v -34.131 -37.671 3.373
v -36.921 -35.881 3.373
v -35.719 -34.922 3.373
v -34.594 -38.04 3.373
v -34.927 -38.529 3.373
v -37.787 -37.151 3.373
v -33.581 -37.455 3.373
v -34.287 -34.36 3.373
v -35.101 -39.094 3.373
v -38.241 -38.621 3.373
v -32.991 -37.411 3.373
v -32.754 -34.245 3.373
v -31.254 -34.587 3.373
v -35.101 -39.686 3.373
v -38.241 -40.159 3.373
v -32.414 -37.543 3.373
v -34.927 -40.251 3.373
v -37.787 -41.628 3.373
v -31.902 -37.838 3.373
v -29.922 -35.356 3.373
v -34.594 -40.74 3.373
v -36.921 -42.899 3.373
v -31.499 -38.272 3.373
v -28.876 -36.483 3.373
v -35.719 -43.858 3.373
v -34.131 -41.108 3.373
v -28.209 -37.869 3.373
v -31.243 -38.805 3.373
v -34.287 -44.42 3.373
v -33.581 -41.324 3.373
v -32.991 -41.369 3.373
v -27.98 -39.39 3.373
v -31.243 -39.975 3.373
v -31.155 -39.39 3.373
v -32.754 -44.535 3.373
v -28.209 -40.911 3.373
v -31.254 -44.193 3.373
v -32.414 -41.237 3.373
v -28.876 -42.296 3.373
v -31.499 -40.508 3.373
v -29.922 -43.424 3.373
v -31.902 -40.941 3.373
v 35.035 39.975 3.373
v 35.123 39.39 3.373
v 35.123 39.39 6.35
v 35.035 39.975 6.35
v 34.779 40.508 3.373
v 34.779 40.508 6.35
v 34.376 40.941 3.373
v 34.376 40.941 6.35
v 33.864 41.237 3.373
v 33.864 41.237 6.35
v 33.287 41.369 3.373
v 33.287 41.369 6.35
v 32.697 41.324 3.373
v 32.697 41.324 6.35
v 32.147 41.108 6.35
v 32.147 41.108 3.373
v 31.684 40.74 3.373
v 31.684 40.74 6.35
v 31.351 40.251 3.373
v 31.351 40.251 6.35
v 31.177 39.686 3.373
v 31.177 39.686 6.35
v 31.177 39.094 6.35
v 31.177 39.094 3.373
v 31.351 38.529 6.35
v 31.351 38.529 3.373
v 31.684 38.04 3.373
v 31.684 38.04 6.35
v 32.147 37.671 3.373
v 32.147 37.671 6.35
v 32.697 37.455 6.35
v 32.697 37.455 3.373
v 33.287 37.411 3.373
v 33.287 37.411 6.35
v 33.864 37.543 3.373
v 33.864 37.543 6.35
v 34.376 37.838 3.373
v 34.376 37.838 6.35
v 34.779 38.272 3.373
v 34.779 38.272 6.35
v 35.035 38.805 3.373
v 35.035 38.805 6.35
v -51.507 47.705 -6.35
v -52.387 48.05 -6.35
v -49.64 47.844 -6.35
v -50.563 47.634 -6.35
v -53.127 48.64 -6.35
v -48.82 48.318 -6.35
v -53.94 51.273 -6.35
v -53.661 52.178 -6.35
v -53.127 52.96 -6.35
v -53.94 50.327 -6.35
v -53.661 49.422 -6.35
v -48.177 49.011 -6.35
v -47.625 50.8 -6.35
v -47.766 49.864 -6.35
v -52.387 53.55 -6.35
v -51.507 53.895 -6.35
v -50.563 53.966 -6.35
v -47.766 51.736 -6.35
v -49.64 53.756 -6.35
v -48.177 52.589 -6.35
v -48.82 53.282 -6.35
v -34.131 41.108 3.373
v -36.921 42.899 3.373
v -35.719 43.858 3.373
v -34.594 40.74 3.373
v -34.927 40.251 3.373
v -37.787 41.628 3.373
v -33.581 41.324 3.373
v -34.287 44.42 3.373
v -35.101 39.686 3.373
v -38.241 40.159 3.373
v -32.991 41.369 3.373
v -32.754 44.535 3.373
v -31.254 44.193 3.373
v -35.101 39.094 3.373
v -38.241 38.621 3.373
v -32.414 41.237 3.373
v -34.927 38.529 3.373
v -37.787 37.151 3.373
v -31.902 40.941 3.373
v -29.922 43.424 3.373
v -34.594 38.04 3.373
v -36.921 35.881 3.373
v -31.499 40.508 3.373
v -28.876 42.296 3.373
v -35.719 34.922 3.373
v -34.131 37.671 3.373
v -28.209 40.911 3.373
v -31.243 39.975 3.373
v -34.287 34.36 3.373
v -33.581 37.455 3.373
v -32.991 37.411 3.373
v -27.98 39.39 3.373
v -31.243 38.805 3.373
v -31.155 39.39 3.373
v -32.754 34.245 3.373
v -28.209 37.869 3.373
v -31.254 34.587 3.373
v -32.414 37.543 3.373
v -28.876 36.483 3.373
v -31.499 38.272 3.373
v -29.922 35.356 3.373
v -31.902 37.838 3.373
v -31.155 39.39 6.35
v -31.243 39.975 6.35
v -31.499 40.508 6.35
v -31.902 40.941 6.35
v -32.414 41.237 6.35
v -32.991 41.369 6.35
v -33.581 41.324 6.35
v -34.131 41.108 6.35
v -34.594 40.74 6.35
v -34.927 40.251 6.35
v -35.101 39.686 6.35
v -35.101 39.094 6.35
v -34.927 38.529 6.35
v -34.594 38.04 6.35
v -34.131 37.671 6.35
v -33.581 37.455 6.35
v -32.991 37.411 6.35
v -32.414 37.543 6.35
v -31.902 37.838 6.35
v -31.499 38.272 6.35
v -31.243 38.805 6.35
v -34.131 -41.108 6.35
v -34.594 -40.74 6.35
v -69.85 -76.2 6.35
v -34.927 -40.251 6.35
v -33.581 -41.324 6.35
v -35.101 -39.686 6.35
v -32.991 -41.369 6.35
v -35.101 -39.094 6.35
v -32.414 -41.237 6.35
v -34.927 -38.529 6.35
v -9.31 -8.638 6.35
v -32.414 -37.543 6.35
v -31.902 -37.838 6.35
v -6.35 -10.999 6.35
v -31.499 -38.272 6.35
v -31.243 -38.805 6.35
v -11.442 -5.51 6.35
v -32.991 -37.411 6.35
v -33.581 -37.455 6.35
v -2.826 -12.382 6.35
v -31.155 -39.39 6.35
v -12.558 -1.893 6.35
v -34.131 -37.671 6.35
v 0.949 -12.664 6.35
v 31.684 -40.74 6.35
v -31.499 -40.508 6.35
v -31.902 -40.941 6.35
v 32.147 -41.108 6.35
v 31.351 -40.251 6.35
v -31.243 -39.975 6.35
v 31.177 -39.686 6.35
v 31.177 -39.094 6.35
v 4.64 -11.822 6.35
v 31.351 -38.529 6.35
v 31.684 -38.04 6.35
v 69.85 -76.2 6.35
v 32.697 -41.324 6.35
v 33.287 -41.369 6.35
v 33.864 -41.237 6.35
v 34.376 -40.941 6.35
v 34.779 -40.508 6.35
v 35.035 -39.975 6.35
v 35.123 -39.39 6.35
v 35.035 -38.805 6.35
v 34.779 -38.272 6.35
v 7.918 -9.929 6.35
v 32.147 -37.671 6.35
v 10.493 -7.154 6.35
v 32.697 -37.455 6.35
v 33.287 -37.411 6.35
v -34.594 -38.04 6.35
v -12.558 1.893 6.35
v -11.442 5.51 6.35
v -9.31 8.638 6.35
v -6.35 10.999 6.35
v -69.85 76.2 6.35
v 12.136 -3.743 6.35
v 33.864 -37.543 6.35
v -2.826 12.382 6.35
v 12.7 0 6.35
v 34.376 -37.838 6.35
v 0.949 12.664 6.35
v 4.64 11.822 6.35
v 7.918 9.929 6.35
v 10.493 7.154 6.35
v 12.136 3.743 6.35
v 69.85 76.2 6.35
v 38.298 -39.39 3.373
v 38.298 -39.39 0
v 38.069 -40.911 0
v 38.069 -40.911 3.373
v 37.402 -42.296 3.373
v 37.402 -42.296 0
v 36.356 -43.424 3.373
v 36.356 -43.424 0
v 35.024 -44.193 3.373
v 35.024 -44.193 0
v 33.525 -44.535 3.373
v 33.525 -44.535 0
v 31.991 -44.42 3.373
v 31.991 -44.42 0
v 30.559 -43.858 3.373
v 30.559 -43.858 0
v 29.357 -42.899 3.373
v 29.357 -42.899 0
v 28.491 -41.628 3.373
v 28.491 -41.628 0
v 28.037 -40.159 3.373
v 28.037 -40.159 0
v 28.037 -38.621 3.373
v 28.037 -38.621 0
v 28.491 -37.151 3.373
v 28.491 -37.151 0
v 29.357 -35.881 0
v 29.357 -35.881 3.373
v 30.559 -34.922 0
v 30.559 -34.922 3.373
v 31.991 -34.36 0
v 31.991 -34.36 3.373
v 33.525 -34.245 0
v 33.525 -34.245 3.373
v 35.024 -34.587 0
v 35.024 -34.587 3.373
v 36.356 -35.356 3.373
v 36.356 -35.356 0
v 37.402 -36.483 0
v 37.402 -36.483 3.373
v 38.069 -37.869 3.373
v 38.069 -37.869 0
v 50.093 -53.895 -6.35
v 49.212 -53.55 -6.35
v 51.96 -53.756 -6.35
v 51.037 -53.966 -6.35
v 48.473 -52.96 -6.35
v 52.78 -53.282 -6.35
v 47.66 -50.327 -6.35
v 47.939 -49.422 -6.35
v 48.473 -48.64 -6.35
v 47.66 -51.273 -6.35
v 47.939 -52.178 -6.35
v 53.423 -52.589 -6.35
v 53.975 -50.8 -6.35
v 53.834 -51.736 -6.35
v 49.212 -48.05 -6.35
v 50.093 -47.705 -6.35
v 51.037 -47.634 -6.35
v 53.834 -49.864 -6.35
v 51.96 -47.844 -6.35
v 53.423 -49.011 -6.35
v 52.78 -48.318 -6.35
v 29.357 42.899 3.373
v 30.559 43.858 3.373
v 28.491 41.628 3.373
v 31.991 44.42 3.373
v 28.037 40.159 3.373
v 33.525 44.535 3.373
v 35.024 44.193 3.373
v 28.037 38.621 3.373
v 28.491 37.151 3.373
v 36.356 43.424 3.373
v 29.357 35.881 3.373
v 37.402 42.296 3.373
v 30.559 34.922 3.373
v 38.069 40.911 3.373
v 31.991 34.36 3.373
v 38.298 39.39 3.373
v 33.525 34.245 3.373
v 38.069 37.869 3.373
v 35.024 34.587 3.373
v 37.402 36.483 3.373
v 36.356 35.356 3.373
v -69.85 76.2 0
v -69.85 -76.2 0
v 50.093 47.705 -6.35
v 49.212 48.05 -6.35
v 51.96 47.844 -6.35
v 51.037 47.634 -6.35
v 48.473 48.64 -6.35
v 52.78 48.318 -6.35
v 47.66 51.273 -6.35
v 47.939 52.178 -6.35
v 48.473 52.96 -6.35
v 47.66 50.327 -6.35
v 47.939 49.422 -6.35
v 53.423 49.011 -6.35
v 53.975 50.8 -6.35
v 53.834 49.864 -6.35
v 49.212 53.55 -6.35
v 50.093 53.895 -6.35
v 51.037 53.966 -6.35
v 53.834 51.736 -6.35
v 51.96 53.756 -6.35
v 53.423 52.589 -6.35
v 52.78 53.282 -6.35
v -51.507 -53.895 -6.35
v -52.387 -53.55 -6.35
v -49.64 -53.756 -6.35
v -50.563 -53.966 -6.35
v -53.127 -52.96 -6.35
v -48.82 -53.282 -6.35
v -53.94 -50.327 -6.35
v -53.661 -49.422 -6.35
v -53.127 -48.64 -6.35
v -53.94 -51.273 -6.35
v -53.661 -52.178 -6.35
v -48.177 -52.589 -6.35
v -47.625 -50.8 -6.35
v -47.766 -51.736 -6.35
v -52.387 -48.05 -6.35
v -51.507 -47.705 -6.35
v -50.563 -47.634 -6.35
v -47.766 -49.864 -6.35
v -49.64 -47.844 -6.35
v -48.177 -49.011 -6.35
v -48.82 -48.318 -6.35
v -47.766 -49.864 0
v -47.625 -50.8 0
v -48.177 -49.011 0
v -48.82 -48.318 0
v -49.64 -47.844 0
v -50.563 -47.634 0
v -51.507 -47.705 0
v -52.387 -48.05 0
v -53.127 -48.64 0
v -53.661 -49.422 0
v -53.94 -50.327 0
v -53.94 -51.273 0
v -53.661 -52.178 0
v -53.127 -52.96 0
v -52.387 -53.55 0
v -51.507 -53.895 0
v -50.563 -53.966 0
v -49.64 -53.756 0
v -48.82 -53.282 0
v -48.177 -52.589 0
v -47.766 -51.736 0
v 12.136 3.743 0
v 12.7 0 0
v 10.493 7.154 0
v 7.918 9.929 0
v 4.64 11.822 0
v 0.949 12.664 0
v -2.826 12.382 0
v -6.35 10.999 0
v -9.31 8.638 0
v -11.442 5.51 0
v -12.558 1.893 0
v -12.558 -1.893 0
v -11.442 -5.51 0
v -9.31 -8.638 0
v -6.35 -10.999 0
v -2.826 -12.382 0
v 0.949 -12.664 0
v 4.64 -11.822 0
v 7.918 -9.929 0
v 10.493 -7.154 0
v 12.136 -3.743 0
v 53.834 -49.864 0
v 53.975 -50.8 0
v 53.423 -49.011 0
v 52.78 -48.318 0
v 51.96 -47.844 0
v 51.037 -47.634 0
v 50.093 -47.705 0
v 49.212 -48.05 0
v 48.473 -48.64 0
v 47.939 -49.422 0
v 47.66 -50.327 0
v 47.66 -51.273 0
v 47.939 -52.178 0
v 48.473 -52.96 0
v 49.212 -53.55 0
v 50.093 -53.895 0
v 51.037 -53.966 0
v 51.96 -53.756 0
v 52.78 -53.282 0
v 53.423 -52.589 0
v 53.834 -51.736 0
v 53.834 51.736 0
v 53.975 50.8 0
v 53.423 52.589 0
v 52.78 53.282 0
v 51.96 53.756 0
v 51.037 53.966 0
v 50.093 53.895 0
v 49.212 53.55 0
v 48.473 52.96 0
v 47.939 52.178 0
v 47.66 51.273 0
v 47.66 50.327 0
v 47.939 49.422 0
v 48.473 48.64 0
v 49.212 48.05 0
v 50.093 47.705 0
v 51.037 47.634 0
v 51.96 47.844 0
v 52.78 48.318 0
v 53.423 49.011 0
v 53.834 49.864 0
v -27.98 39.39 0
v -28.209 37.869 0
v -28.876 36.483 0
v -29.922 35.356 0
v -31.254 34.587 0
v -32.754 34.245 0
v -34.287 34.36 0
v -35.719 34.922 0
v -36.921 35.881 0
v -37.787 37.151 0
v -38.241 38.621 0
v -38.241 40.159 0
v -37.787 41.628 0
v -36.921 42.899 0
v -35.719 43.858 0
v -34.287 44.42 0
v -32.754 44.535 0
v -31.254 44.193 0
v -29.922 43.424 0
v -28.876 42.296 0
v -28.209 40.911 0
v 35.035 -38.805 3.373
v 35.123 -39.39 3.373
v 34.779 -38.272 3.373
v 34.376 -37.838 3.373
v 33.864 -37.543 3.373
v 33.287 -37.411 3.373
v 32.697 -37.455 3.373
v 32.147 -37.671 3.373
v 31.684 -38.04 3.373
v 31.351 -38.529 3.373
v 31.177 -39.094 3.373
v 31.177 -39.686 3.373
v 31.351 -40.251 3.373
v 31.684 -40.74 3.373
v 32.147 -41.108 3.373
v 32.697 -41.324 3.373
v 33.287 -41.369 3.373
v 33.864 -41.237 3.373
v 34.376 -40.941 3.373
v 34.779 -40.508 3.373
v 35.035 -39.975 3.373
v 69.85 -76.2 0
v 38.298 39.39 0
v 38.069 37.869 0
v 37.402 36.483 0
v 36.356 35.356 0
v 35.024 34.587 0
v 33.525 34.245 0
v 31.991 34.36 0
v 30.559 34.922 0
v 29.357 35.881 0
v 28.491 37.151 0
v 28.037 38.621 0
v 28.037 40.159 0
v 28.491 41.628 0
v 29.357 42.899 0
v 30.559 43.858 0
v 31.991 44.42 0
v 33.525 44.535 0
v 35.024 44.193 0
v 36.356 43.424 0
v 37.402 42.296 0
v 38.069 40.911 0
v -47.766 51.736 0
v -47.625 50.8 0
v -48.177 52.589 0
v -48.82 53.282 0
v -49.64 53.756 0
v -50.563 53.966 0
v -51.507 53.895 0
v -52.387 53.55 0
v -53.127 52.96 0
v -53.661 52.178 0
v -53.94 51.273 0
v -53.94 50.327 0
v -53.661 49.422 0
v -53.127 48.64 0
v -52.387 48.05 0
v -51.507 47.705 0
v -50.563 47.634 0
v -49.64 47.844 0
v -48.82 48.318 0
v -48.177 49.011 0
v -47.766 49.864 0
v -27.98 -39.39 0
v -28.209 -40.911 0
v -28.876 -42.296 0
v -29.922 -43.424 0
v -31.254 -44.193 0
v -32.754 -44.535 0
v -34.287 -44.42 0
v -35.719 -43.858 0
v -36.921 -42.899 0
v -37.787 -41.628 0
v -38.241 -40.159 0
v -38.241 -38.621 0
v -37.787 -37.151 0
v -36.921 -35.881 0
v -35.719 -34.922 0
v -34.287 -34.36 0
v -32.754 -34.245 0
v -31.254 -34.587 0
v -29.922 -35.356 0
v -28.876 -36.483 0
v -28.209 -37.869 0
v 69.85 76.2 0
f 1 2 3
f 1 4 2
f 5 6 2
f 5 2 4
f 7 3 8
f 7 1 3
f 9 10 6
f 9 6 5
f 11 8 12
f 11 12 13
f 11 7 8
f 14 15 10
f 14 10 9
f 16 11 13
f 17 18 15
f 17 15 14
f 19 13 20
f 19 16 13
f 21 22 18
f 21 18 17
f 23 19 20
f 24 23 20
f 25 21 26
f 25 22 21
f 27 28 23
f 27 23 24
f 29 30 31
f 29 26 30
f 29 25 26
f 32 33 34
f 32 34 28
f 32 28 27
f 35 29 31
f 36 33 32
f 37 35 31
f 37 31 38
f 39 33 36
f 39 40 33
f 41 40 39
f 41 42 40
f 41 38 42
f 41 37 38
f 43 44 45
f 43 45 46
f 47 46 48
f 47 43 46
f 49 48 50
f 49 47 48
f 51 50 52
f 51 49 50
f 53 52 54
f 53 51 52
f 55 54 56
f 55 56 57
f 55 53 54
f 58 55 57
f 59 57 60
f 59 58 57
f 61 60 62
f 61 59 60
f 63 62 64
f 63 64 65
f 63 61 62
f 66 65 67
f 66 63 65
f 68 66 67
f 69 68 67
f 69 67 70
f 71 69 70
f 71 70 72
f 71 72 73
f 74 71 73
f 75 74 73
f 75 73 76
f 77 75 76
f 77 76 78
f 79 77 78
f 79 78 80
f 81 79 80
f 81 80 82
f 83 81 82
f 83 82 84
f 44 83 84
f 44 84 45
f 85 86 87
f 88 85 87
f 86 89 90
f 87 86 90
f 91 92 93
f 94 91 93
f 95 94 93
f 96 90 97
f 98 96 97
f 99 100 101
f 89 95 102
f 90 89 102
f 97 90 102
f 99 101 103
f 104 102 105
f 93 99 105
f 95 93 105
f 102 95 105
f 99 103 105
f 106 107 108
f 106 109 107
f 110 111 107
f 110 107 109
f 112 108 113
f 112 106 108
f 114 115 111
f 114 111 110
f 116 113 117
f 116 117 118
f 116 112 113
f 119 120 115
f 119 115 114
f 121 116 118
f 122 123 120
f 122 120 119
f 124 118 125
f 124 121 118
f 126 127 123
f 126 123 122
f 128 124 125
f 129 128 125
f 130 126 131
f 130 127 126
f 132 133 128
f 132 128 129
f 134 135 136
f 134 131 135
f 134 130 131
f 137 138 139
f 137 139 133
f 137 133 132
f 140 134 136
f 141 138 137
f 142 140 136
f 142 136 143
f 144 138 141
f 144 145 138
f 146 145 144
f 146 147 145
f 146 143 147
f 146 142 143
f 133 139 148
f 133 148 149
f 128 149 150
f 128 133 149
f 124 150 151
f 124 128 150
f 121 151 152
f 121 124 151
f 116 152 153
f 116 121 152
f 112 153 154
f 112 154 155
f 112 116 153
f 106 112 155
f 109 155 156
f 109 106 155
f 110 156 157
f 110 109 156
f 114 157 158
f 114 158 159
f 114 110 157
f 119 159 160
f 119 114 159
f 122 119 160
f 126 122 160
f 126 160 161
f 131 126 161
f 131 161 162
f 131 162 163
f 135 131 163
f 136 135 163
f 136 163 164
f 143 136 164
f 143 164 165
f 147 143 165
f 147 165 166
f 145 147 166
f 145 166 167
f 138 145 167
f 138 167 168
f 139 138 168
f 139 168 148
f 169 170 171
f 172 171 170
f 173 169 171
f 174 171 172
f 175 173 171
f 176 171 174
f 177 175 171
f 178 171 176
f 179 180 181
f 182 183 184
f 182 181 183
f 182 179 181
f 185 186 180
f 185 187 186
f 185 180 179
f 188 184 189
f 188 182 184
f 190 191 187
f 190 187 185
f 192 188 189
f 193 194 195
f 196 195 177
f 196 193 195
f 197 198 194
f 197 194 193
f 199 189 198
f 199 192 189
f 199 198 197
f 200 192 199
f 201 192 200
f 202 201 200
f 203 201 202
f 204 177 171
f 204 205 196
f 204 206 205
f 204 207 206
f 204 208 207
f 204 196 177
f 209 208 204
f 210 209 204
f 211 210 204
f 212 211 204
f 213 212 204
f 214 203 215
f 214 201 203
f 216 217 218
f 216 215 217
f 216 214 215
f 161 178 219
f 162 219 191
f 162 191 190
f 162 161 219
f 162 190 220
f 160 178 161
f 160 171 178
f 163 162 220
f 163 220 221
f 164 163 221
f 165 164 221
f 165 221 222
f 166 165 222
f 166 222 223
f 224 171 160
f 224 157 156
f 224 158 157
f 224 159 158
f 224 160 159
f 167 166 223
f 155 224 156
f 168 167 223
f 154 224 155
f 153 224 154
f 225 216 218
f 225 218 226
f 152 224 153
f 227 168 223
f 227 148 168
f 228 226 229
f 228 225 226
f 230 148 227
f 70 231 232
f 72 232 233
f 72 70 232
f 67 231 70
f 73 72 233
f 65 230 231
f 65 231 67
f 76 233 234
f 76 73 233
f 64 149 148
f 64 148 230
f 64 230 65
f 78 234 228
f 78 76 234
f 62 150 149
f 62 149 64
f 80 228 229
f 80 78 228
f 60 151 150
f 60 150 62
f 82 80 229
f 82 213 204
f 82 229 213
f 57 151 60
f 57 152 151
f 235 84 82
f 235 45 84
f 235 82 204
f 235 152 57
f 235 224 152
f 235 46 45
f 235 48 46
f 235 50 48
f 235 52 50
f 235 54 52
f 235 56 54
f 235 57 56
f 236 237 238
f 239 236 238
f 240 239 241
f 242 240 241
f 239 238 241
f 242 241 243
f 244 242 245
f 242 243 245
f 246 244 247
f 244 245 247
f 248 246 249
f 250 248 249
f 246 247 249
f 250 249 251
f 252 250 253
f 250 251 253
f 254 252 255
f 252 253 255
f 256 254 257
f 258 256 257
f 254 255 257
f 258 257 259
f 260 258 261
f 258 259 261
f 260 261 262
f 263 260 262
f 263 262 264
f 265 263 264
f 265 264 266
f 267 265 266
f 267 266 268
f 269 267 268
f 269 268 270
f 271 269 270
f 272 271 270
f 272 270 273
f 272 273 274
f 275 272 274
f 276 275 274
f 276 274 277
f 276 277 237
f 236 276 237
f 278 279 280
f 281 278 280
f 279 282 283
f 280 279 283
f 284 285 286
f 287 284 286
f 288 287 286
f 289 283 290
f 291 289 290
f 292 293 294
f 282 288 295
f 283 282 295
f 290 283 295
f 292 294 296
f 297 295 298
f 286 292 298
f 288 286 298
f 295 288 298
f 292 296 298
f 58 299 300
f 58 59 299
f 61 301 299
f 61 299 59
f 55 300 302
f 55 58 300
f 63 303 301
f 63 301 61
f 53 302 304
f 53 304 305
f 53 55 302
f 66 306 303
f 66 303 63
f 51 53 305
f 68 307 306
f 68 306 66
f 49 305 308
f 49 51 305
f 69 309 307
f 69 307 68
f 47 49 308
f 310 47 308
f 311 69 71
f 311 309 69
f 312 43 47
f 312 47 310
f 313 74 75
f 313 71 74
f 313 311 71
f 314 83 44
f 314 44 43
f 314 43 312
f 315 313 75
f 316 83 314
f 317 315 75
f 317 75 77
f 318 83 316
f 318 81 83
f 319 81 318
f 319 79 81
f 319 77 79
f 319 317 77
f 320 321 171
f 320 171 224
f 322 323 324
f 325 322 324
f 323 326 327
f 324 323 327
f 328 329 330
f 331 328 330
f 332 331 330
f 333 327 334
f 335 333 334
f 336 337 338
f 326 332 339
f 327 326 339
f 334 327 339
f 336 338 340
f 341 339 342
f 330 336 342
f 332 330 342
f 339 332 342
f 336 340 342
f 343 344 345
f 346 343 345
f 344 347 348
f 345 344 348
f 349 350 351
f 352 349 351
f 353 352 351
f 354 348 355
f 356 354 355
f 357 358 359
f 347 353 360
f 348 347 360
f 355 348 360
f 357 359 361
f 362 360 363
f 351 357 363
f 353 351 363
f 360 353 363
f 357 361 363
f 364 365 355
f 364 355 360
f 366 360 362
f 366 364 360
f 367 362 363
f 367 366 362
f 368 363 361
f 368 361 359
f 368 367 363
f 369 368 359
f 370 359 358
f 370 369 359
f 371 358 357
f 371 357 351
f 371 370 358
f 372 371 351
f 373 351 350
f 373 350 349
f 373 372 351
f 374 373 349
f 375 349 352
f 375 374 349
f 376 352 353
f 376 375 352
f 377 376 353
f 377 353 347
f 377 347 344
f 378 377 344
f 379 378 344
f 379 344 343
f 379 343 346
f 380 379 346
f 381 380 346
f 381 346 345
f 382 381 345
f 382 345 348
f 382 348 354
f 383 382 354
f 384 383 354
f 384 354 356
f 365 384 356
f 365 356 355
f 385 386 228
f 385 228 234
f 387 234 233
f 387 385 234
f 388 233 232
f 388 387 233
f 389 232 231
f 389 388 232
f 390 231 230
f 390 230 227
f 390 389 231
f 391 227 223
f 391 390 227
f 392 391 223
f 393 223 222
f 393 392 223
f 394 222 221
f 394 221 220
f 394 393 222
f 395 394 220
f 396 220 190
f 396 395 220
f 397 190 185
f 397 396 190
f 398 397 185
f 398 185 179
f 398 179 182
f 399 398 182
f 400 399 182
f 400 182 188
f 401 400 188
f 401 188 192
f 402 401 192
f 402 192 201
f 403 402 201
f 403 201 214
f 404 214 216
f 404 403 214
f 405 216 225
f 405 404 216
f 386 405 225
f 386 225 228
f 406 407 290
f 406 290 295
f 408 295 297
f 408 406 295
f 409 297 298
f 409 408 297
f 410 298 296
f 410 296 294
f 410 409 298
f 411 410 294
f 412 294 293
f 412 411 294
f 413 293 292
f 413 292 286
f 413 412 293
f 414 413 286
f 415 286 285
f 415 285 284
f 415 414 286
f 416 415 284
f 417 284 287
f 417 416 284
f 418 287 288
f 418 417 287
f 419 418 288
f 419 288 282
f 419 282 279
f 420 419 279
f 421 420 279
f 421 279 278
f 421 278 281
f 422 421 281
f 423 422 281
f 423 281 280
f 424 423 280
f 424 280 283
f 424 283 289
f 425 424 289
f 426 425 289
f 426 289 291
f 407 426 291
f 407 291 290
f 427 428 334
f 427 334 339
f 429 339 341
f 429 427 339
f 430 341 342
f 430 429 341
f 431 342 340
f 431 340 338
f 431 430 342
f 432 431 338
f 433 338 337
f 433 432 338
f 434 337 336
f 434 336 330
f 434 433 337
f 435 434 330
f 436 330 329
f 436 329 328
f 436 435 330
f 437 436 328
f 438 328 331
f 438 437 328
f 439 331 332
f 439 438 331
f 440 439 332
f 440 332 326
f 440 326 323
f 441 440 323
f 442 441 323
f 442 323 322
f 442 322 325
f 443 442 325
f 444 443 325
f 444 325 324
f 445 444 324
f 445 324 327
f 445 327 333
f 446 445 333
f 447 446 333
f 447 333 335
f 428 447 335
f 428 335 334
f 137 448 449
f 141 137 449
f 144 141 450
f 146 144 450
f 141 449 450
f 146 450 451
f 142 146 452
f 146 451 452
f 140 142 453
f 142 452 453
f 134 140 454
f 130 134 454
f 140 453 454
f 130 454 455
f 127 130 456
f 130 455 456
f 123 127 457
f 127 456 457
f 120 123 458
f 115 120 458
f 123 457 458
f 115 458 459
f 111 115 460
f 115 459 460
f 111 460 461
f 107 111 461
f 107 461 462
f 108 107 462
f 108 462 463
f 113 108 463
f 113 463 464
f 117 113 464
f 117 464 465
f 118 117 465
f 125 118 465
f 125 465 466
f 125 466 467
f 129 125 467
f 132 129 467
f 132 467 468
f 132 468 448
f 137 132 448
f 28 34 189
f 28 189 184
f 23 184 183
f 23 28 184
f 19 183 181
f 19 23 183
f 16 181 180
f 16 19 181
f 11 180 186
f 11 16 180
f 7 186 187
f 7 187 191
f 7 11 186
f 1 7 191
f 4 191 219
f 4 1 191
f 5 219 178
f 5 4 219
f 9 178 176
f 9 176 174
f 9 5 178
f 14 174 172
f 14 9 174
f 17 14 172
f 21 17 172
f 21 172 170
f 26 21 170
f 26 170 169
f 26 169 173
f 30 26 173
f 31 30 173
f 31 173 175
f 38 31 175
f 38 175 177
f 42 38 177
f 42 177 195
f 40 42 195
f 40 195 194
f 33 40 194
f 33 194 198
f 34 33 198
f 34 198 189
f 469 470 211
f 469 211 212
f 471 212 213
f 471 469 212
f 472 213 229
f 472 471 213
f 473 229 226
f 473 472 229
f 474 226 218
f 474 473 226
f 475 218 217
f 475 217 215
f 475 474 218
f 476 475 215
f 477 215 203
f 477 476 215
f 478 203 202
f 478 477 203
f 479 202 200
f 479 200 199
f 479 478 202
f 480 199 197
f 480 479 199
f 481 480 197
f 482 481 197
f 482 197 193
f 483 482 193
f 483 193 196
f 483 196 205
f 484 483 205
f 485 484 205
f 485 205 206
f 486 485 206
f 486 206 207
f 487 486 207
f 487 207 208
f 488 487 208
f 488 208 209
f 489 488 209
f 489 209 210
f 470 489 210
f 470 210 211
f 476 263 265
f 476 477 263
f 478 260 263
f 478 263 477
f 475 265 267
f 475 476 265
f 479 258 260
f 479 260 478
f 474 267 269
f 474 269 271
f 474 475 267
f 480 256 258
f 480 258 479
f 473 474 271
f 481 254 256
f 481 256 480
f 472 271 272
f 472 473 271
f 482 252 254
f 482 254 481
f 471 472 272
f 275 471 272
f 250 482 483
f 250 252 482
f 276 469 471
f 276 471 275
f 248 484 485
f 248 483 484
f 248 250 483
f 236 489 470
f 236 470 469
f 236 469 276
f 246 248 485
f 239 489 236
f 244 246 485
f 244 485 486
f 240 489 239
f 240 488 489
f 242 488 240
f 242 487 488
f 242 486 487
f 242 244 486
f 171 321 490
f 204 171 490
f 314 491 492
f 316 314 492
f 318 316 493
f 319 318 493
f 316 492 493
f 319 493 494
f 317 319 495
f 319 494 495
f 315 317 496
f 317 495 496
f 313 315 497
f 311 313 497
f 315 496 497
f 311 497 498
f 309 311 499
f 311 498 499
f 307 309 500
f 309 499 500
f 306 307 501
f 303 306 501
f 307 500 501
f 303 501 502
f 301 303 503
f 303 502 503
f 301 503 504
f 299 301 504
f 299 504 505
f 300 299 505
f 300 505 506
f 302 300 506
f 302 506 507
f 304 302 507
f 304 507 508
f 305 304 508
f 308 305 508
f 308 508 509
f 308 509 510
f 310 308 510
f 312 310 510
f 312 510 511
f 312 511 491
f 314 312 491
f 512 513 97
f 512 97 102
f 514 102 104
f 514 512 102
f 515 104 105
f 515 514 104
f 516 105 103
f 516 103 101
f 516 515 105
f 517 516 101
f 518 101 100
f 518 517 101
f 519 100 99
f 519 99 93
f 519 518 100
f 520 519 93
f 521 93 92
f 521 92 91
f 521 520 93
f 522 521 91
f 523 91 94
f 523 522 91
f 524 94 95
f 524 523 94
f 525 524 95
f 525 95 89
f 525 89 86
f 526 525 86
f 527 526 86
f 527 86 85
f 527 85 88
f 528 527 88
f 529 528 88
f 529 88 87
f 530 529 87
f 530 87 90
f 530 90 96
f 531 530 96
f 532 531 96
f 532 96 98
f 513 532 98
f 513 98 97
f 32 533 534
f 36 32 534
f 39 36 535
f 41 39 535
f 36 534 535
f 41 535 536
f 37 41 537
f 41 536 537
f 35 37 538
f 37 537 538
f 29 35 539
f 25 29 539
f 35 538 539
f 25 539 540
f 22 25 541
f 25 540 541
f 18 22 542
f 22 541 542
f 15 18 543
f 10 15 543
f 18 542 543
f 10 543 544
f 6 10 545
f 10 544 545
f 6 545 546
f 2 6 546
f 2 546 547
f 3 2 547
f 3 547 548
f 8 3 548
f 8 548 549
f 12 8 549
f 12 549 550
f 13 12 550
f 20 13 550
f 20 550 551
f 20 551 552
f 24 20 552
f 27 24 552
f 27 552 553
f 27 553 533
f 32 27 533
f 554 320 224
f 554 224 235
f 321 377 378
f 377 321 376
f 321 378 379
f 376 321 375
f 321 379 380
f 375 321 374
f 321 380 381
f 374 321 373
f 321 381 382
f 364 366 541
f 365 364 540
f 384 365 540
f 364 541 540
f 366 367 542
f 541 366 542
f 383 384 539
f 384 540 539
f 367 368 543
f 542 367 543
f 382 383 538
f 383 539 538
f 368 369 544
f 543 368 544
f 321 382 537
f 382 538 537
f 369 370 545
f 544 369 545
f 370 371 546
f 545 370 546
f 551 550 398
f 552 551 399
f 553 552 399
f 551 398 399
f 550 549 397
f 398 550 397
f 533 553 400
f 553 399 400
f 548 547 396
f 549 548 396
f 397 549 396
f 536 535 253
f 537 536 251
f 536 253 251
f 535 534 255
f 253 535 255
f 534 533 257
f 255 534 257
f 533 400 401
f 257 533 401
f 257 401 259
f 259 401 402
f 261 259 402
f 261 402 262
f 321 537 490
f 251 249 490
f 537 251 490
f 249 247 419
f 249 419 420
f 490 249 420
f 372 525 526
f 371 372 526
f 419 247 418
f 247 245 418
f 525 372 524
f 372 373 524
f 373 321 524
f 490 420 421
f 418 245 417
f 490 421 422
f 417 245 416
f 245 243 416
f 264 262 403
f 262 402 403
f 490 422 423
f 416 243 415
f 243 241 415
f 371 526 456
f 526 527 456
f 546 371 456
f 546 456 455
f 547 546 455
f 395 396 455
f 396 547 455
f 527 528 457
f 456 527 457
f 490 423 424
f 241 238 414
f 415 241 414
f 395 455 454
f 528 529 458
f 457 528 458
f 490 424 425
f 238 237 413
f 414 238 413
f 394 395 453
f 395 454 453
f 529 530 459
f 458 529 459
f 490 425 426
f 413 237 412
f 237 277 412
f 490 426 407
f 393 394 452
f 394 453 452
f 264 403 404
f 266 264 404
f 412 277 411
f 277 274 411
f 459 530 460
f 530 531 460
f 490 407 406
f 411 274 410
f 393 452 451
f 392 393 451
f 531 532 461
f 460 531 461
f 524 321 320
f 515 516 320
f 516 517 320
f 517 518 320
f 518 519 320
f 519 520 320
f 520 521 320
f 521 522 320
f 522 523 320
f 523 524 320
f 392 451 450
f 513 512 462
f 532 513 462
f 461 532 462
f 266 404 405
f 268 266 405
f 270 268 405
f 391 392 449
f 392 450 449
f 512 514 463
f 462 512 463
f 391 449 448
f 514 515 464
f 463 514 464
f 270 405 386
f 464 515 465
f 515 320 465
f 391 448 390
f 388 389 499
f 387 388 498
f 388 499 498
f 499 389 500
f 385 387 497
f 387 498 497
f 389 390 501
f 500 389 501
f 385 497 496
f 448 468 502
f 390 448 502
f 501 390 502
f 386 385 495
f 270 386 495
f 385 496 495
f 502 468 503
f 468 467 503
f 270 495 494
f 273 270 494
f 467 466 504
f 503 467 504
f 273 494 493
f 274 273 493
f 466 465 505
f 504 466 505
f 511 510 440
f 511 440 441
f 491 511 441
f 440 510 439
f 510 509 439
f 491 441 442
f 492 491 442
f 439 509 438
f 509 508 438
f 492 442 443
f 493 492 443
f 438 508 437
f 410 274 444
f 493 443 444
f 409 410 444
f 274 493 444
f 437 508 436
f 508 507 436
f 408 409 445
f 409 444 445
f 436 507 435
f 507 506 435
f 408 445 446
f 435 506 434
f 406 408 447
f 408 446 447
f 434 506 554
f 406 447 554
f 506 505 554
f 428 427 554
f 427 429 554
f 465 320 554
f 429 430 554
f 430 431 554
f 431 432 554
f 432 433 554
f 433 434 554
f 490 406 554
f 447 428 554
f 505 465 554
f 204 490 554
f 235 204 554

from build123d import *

# Parameters (mm, degrees)
F0_W           = 139.7
F0_H           = 152.4
F0_R           = 3.175
F0_R_2         = 1.984375
F0_R_3         = 12.7
F1_DEPTH       = 6.35
F2_R           = 3.175
F3_DEPTH       = 12.7
F5_D           = 3.9624
F5_CBORE_D     = 10.31875
F5_CBORE_DEPTH = 3.3734375


with BuildPart() as f1:
    # F0 (on Top) → F1 (new body)
    with BuildSketch(Plane.XY):
        Rectangle(F0_W, F0_H)
        with Locations((-50.8, -50.8)):
            Circle(F0_R, mode=Mode.SUBTRACT)
        with Locations((-25.4, -50.8)):
            Circle(F0_R, mode=Mode.SUBTRACT)
        with Locations((-33.1390625, -39.38984375)):
            Circle(F0_R_2, mode=Mode.SUBTRACT)
        with Locations((-50.8, -25.4)):
            Circle(F0_R, mode=Mode.SUBTRACT)
        with Locations((-25.4, -25.4)):
            Circle(F0_R, mode=Mode.SUBTRACT)
        with Locations((0, -50.8)):
            Circle(F0_R, mode=Mode.SUBTRACT)
        with Locations((25.4, -50.8)):
            Circle(F0_R, mode=Mode.SUBTRACT)
        with Locations((33.1390625, -39.38984375)):
            Circle(F0_R_2, mode=Mode.SUBTRACT)
        with Locations((50.8, -50.8)):
            Circle(F0_R, mode=Mode.SUBTRACT)
        with Locations((0, -25.4)):
            Circle(F0_R, mode=Mode.SUBTRACT)
        with Locations((25.4, -25.4)):
            Circle(F0_R, mode=Mode.SUBTRACT)
        with Locations((50.8, -25.4)):
            Circle(F0_R, mode=Mode.SUBTRACT)
        with Locations((-50.8, 0)):
            Circle(F0_R, mode=Mode.SUBTRACT)
        with Locations((-50.8, 25.4)):
            Circle(F0_R, mode=Mode.SUBTRACT)
        with Locations((-25.4, 0)):
            Circle(F0_R, mode=Mode.SUBTRACT)
        with Locations((-25.4, 25.4)):
            Circle(F0_R, mode=Mode.SUBTRACT)
        with Locations((-50.8, 50.8)):
            Circle(F0_R, mode=Mode.SUBTRACT)
        with Locations((-33.1390625, 39.38984375)):
            Circle(F0_R_2, mode=Mode.SUBTRACT)
        with Locations((-25.4, 50.8)):
            Circle(F0_R, mode=Mode.SUBTRACT)
        Circle(F0_R_3, mode=Mode.SUBTRACT)
        with Locations((25.4, 0)):
            Circle(F0_R, mode=Mode.SUBTRACT)
        with Locations((0, 25.4)):
            Circle(F0_R, mode=Mode.SUBTRACT)
        with Locations((25.4, 25.4)):
            Circle(F0_R, mode=Mode.SUBTRACT)
        with Locations((50.8, 0)):
            Circle(F0_R, mode=Mode.SUBTRACT)
        with Locations((50.8, 25.4)):
            Circle(F0_R, mode=Mode.SUBTRACT)
        with Locations((0, 50.8)):
            Circle(F0_R, mode=Mode.SUBTRACT)
        with Locations((33.1390625, 39.38984375)):
            Circle(F0_R_2, mode=Mode.SUBTRACT)
        with Locations((25.4, 50.8)):
            Circle(F0_R, mode=Mode.SUBTRACT)
        with Locations((50.8, 50.8)):
            Circle(F0_R, mode=Mode.SUBTRACT)
        with Locations((-25.4, 50.8)):
            Circle(F0_R)
        with Locations((0, 50.8)):
            Circle(F0_R)
        with Locations((25.4, 50.8)):
            Circle(F0_R)
        with Locations((50.8, 25.4)):
            Circle(F0_R)
        with Locations((50.8, 0)):
            Circle(F0_R)
        with Locations((50.8, -25.4)):
            Circle(F0_R)
        with Locations((25.4, -50.8)):
            Circle(F0_R)
        with Locations((0, -50.8)):
            Circle(F0_R)
        with Locations((-25.4, -50.8)):
            Circle(F0_R)
        with Locations((-50.8, -25.4)):
            Circle(F0_R)
        with Locations((-50.8, 0)):
            Circle(F0_R)
        with Locations((-50.8, 25.4)):
            Circle(F0_R)
        with Locations((-25.4, 25.4)):
            Circle(F0_R)
        with Locations((0, 25.4)):
            Circle(F0_R)
        with Locations((25.4, 25.4)):
            Circle(F0_R)
        with Locations((25.4, 0)):
            Circle(F0_R)
        with Locations((25.4, -25.4)):
            Circle(F0_R)
        with Locations((0, -25.4)):
            Circle(F0_R)
        with Locations((-25.4, 0)):
            Circle(F0_R)
        with Locations((-25.4, -25.4)):
            Circle(F0_R)
    extrude(amount=F1_DEPTH)

    # F2 (on face) → F3 (join)
    with BuildSketch(Plane.XY.offset(6.35)):
        with Locations((50.8, -50.8)):
            Circle(F2_R)
        with Locations((-50.8, -50.8)):
            Circle(F2_R)
        with Locations((-50.8, 50.8)):
            Circle(F2_R)
        with Locations((50.8, 50.8)):
            Circle(F2_R)
    extrude(amount=-F3_DEPTH)

    # F5 (through all)
    with Locations(Plane(origin=(0, 0, 0), x_dir=(1, 0, 0), z_dir=(0, 0, -1))):
        with Locations((-33.1390625, 39.38984375), (33.1390625, 39.38984375), (33.1390625, -39.38984375), (-33.1390625, -39.38984375)):
            CounterBoreHole(F5_D / 2, F5_CBORE_D / 2, F5_CBORE_DEPTH)


solid = f1.part
